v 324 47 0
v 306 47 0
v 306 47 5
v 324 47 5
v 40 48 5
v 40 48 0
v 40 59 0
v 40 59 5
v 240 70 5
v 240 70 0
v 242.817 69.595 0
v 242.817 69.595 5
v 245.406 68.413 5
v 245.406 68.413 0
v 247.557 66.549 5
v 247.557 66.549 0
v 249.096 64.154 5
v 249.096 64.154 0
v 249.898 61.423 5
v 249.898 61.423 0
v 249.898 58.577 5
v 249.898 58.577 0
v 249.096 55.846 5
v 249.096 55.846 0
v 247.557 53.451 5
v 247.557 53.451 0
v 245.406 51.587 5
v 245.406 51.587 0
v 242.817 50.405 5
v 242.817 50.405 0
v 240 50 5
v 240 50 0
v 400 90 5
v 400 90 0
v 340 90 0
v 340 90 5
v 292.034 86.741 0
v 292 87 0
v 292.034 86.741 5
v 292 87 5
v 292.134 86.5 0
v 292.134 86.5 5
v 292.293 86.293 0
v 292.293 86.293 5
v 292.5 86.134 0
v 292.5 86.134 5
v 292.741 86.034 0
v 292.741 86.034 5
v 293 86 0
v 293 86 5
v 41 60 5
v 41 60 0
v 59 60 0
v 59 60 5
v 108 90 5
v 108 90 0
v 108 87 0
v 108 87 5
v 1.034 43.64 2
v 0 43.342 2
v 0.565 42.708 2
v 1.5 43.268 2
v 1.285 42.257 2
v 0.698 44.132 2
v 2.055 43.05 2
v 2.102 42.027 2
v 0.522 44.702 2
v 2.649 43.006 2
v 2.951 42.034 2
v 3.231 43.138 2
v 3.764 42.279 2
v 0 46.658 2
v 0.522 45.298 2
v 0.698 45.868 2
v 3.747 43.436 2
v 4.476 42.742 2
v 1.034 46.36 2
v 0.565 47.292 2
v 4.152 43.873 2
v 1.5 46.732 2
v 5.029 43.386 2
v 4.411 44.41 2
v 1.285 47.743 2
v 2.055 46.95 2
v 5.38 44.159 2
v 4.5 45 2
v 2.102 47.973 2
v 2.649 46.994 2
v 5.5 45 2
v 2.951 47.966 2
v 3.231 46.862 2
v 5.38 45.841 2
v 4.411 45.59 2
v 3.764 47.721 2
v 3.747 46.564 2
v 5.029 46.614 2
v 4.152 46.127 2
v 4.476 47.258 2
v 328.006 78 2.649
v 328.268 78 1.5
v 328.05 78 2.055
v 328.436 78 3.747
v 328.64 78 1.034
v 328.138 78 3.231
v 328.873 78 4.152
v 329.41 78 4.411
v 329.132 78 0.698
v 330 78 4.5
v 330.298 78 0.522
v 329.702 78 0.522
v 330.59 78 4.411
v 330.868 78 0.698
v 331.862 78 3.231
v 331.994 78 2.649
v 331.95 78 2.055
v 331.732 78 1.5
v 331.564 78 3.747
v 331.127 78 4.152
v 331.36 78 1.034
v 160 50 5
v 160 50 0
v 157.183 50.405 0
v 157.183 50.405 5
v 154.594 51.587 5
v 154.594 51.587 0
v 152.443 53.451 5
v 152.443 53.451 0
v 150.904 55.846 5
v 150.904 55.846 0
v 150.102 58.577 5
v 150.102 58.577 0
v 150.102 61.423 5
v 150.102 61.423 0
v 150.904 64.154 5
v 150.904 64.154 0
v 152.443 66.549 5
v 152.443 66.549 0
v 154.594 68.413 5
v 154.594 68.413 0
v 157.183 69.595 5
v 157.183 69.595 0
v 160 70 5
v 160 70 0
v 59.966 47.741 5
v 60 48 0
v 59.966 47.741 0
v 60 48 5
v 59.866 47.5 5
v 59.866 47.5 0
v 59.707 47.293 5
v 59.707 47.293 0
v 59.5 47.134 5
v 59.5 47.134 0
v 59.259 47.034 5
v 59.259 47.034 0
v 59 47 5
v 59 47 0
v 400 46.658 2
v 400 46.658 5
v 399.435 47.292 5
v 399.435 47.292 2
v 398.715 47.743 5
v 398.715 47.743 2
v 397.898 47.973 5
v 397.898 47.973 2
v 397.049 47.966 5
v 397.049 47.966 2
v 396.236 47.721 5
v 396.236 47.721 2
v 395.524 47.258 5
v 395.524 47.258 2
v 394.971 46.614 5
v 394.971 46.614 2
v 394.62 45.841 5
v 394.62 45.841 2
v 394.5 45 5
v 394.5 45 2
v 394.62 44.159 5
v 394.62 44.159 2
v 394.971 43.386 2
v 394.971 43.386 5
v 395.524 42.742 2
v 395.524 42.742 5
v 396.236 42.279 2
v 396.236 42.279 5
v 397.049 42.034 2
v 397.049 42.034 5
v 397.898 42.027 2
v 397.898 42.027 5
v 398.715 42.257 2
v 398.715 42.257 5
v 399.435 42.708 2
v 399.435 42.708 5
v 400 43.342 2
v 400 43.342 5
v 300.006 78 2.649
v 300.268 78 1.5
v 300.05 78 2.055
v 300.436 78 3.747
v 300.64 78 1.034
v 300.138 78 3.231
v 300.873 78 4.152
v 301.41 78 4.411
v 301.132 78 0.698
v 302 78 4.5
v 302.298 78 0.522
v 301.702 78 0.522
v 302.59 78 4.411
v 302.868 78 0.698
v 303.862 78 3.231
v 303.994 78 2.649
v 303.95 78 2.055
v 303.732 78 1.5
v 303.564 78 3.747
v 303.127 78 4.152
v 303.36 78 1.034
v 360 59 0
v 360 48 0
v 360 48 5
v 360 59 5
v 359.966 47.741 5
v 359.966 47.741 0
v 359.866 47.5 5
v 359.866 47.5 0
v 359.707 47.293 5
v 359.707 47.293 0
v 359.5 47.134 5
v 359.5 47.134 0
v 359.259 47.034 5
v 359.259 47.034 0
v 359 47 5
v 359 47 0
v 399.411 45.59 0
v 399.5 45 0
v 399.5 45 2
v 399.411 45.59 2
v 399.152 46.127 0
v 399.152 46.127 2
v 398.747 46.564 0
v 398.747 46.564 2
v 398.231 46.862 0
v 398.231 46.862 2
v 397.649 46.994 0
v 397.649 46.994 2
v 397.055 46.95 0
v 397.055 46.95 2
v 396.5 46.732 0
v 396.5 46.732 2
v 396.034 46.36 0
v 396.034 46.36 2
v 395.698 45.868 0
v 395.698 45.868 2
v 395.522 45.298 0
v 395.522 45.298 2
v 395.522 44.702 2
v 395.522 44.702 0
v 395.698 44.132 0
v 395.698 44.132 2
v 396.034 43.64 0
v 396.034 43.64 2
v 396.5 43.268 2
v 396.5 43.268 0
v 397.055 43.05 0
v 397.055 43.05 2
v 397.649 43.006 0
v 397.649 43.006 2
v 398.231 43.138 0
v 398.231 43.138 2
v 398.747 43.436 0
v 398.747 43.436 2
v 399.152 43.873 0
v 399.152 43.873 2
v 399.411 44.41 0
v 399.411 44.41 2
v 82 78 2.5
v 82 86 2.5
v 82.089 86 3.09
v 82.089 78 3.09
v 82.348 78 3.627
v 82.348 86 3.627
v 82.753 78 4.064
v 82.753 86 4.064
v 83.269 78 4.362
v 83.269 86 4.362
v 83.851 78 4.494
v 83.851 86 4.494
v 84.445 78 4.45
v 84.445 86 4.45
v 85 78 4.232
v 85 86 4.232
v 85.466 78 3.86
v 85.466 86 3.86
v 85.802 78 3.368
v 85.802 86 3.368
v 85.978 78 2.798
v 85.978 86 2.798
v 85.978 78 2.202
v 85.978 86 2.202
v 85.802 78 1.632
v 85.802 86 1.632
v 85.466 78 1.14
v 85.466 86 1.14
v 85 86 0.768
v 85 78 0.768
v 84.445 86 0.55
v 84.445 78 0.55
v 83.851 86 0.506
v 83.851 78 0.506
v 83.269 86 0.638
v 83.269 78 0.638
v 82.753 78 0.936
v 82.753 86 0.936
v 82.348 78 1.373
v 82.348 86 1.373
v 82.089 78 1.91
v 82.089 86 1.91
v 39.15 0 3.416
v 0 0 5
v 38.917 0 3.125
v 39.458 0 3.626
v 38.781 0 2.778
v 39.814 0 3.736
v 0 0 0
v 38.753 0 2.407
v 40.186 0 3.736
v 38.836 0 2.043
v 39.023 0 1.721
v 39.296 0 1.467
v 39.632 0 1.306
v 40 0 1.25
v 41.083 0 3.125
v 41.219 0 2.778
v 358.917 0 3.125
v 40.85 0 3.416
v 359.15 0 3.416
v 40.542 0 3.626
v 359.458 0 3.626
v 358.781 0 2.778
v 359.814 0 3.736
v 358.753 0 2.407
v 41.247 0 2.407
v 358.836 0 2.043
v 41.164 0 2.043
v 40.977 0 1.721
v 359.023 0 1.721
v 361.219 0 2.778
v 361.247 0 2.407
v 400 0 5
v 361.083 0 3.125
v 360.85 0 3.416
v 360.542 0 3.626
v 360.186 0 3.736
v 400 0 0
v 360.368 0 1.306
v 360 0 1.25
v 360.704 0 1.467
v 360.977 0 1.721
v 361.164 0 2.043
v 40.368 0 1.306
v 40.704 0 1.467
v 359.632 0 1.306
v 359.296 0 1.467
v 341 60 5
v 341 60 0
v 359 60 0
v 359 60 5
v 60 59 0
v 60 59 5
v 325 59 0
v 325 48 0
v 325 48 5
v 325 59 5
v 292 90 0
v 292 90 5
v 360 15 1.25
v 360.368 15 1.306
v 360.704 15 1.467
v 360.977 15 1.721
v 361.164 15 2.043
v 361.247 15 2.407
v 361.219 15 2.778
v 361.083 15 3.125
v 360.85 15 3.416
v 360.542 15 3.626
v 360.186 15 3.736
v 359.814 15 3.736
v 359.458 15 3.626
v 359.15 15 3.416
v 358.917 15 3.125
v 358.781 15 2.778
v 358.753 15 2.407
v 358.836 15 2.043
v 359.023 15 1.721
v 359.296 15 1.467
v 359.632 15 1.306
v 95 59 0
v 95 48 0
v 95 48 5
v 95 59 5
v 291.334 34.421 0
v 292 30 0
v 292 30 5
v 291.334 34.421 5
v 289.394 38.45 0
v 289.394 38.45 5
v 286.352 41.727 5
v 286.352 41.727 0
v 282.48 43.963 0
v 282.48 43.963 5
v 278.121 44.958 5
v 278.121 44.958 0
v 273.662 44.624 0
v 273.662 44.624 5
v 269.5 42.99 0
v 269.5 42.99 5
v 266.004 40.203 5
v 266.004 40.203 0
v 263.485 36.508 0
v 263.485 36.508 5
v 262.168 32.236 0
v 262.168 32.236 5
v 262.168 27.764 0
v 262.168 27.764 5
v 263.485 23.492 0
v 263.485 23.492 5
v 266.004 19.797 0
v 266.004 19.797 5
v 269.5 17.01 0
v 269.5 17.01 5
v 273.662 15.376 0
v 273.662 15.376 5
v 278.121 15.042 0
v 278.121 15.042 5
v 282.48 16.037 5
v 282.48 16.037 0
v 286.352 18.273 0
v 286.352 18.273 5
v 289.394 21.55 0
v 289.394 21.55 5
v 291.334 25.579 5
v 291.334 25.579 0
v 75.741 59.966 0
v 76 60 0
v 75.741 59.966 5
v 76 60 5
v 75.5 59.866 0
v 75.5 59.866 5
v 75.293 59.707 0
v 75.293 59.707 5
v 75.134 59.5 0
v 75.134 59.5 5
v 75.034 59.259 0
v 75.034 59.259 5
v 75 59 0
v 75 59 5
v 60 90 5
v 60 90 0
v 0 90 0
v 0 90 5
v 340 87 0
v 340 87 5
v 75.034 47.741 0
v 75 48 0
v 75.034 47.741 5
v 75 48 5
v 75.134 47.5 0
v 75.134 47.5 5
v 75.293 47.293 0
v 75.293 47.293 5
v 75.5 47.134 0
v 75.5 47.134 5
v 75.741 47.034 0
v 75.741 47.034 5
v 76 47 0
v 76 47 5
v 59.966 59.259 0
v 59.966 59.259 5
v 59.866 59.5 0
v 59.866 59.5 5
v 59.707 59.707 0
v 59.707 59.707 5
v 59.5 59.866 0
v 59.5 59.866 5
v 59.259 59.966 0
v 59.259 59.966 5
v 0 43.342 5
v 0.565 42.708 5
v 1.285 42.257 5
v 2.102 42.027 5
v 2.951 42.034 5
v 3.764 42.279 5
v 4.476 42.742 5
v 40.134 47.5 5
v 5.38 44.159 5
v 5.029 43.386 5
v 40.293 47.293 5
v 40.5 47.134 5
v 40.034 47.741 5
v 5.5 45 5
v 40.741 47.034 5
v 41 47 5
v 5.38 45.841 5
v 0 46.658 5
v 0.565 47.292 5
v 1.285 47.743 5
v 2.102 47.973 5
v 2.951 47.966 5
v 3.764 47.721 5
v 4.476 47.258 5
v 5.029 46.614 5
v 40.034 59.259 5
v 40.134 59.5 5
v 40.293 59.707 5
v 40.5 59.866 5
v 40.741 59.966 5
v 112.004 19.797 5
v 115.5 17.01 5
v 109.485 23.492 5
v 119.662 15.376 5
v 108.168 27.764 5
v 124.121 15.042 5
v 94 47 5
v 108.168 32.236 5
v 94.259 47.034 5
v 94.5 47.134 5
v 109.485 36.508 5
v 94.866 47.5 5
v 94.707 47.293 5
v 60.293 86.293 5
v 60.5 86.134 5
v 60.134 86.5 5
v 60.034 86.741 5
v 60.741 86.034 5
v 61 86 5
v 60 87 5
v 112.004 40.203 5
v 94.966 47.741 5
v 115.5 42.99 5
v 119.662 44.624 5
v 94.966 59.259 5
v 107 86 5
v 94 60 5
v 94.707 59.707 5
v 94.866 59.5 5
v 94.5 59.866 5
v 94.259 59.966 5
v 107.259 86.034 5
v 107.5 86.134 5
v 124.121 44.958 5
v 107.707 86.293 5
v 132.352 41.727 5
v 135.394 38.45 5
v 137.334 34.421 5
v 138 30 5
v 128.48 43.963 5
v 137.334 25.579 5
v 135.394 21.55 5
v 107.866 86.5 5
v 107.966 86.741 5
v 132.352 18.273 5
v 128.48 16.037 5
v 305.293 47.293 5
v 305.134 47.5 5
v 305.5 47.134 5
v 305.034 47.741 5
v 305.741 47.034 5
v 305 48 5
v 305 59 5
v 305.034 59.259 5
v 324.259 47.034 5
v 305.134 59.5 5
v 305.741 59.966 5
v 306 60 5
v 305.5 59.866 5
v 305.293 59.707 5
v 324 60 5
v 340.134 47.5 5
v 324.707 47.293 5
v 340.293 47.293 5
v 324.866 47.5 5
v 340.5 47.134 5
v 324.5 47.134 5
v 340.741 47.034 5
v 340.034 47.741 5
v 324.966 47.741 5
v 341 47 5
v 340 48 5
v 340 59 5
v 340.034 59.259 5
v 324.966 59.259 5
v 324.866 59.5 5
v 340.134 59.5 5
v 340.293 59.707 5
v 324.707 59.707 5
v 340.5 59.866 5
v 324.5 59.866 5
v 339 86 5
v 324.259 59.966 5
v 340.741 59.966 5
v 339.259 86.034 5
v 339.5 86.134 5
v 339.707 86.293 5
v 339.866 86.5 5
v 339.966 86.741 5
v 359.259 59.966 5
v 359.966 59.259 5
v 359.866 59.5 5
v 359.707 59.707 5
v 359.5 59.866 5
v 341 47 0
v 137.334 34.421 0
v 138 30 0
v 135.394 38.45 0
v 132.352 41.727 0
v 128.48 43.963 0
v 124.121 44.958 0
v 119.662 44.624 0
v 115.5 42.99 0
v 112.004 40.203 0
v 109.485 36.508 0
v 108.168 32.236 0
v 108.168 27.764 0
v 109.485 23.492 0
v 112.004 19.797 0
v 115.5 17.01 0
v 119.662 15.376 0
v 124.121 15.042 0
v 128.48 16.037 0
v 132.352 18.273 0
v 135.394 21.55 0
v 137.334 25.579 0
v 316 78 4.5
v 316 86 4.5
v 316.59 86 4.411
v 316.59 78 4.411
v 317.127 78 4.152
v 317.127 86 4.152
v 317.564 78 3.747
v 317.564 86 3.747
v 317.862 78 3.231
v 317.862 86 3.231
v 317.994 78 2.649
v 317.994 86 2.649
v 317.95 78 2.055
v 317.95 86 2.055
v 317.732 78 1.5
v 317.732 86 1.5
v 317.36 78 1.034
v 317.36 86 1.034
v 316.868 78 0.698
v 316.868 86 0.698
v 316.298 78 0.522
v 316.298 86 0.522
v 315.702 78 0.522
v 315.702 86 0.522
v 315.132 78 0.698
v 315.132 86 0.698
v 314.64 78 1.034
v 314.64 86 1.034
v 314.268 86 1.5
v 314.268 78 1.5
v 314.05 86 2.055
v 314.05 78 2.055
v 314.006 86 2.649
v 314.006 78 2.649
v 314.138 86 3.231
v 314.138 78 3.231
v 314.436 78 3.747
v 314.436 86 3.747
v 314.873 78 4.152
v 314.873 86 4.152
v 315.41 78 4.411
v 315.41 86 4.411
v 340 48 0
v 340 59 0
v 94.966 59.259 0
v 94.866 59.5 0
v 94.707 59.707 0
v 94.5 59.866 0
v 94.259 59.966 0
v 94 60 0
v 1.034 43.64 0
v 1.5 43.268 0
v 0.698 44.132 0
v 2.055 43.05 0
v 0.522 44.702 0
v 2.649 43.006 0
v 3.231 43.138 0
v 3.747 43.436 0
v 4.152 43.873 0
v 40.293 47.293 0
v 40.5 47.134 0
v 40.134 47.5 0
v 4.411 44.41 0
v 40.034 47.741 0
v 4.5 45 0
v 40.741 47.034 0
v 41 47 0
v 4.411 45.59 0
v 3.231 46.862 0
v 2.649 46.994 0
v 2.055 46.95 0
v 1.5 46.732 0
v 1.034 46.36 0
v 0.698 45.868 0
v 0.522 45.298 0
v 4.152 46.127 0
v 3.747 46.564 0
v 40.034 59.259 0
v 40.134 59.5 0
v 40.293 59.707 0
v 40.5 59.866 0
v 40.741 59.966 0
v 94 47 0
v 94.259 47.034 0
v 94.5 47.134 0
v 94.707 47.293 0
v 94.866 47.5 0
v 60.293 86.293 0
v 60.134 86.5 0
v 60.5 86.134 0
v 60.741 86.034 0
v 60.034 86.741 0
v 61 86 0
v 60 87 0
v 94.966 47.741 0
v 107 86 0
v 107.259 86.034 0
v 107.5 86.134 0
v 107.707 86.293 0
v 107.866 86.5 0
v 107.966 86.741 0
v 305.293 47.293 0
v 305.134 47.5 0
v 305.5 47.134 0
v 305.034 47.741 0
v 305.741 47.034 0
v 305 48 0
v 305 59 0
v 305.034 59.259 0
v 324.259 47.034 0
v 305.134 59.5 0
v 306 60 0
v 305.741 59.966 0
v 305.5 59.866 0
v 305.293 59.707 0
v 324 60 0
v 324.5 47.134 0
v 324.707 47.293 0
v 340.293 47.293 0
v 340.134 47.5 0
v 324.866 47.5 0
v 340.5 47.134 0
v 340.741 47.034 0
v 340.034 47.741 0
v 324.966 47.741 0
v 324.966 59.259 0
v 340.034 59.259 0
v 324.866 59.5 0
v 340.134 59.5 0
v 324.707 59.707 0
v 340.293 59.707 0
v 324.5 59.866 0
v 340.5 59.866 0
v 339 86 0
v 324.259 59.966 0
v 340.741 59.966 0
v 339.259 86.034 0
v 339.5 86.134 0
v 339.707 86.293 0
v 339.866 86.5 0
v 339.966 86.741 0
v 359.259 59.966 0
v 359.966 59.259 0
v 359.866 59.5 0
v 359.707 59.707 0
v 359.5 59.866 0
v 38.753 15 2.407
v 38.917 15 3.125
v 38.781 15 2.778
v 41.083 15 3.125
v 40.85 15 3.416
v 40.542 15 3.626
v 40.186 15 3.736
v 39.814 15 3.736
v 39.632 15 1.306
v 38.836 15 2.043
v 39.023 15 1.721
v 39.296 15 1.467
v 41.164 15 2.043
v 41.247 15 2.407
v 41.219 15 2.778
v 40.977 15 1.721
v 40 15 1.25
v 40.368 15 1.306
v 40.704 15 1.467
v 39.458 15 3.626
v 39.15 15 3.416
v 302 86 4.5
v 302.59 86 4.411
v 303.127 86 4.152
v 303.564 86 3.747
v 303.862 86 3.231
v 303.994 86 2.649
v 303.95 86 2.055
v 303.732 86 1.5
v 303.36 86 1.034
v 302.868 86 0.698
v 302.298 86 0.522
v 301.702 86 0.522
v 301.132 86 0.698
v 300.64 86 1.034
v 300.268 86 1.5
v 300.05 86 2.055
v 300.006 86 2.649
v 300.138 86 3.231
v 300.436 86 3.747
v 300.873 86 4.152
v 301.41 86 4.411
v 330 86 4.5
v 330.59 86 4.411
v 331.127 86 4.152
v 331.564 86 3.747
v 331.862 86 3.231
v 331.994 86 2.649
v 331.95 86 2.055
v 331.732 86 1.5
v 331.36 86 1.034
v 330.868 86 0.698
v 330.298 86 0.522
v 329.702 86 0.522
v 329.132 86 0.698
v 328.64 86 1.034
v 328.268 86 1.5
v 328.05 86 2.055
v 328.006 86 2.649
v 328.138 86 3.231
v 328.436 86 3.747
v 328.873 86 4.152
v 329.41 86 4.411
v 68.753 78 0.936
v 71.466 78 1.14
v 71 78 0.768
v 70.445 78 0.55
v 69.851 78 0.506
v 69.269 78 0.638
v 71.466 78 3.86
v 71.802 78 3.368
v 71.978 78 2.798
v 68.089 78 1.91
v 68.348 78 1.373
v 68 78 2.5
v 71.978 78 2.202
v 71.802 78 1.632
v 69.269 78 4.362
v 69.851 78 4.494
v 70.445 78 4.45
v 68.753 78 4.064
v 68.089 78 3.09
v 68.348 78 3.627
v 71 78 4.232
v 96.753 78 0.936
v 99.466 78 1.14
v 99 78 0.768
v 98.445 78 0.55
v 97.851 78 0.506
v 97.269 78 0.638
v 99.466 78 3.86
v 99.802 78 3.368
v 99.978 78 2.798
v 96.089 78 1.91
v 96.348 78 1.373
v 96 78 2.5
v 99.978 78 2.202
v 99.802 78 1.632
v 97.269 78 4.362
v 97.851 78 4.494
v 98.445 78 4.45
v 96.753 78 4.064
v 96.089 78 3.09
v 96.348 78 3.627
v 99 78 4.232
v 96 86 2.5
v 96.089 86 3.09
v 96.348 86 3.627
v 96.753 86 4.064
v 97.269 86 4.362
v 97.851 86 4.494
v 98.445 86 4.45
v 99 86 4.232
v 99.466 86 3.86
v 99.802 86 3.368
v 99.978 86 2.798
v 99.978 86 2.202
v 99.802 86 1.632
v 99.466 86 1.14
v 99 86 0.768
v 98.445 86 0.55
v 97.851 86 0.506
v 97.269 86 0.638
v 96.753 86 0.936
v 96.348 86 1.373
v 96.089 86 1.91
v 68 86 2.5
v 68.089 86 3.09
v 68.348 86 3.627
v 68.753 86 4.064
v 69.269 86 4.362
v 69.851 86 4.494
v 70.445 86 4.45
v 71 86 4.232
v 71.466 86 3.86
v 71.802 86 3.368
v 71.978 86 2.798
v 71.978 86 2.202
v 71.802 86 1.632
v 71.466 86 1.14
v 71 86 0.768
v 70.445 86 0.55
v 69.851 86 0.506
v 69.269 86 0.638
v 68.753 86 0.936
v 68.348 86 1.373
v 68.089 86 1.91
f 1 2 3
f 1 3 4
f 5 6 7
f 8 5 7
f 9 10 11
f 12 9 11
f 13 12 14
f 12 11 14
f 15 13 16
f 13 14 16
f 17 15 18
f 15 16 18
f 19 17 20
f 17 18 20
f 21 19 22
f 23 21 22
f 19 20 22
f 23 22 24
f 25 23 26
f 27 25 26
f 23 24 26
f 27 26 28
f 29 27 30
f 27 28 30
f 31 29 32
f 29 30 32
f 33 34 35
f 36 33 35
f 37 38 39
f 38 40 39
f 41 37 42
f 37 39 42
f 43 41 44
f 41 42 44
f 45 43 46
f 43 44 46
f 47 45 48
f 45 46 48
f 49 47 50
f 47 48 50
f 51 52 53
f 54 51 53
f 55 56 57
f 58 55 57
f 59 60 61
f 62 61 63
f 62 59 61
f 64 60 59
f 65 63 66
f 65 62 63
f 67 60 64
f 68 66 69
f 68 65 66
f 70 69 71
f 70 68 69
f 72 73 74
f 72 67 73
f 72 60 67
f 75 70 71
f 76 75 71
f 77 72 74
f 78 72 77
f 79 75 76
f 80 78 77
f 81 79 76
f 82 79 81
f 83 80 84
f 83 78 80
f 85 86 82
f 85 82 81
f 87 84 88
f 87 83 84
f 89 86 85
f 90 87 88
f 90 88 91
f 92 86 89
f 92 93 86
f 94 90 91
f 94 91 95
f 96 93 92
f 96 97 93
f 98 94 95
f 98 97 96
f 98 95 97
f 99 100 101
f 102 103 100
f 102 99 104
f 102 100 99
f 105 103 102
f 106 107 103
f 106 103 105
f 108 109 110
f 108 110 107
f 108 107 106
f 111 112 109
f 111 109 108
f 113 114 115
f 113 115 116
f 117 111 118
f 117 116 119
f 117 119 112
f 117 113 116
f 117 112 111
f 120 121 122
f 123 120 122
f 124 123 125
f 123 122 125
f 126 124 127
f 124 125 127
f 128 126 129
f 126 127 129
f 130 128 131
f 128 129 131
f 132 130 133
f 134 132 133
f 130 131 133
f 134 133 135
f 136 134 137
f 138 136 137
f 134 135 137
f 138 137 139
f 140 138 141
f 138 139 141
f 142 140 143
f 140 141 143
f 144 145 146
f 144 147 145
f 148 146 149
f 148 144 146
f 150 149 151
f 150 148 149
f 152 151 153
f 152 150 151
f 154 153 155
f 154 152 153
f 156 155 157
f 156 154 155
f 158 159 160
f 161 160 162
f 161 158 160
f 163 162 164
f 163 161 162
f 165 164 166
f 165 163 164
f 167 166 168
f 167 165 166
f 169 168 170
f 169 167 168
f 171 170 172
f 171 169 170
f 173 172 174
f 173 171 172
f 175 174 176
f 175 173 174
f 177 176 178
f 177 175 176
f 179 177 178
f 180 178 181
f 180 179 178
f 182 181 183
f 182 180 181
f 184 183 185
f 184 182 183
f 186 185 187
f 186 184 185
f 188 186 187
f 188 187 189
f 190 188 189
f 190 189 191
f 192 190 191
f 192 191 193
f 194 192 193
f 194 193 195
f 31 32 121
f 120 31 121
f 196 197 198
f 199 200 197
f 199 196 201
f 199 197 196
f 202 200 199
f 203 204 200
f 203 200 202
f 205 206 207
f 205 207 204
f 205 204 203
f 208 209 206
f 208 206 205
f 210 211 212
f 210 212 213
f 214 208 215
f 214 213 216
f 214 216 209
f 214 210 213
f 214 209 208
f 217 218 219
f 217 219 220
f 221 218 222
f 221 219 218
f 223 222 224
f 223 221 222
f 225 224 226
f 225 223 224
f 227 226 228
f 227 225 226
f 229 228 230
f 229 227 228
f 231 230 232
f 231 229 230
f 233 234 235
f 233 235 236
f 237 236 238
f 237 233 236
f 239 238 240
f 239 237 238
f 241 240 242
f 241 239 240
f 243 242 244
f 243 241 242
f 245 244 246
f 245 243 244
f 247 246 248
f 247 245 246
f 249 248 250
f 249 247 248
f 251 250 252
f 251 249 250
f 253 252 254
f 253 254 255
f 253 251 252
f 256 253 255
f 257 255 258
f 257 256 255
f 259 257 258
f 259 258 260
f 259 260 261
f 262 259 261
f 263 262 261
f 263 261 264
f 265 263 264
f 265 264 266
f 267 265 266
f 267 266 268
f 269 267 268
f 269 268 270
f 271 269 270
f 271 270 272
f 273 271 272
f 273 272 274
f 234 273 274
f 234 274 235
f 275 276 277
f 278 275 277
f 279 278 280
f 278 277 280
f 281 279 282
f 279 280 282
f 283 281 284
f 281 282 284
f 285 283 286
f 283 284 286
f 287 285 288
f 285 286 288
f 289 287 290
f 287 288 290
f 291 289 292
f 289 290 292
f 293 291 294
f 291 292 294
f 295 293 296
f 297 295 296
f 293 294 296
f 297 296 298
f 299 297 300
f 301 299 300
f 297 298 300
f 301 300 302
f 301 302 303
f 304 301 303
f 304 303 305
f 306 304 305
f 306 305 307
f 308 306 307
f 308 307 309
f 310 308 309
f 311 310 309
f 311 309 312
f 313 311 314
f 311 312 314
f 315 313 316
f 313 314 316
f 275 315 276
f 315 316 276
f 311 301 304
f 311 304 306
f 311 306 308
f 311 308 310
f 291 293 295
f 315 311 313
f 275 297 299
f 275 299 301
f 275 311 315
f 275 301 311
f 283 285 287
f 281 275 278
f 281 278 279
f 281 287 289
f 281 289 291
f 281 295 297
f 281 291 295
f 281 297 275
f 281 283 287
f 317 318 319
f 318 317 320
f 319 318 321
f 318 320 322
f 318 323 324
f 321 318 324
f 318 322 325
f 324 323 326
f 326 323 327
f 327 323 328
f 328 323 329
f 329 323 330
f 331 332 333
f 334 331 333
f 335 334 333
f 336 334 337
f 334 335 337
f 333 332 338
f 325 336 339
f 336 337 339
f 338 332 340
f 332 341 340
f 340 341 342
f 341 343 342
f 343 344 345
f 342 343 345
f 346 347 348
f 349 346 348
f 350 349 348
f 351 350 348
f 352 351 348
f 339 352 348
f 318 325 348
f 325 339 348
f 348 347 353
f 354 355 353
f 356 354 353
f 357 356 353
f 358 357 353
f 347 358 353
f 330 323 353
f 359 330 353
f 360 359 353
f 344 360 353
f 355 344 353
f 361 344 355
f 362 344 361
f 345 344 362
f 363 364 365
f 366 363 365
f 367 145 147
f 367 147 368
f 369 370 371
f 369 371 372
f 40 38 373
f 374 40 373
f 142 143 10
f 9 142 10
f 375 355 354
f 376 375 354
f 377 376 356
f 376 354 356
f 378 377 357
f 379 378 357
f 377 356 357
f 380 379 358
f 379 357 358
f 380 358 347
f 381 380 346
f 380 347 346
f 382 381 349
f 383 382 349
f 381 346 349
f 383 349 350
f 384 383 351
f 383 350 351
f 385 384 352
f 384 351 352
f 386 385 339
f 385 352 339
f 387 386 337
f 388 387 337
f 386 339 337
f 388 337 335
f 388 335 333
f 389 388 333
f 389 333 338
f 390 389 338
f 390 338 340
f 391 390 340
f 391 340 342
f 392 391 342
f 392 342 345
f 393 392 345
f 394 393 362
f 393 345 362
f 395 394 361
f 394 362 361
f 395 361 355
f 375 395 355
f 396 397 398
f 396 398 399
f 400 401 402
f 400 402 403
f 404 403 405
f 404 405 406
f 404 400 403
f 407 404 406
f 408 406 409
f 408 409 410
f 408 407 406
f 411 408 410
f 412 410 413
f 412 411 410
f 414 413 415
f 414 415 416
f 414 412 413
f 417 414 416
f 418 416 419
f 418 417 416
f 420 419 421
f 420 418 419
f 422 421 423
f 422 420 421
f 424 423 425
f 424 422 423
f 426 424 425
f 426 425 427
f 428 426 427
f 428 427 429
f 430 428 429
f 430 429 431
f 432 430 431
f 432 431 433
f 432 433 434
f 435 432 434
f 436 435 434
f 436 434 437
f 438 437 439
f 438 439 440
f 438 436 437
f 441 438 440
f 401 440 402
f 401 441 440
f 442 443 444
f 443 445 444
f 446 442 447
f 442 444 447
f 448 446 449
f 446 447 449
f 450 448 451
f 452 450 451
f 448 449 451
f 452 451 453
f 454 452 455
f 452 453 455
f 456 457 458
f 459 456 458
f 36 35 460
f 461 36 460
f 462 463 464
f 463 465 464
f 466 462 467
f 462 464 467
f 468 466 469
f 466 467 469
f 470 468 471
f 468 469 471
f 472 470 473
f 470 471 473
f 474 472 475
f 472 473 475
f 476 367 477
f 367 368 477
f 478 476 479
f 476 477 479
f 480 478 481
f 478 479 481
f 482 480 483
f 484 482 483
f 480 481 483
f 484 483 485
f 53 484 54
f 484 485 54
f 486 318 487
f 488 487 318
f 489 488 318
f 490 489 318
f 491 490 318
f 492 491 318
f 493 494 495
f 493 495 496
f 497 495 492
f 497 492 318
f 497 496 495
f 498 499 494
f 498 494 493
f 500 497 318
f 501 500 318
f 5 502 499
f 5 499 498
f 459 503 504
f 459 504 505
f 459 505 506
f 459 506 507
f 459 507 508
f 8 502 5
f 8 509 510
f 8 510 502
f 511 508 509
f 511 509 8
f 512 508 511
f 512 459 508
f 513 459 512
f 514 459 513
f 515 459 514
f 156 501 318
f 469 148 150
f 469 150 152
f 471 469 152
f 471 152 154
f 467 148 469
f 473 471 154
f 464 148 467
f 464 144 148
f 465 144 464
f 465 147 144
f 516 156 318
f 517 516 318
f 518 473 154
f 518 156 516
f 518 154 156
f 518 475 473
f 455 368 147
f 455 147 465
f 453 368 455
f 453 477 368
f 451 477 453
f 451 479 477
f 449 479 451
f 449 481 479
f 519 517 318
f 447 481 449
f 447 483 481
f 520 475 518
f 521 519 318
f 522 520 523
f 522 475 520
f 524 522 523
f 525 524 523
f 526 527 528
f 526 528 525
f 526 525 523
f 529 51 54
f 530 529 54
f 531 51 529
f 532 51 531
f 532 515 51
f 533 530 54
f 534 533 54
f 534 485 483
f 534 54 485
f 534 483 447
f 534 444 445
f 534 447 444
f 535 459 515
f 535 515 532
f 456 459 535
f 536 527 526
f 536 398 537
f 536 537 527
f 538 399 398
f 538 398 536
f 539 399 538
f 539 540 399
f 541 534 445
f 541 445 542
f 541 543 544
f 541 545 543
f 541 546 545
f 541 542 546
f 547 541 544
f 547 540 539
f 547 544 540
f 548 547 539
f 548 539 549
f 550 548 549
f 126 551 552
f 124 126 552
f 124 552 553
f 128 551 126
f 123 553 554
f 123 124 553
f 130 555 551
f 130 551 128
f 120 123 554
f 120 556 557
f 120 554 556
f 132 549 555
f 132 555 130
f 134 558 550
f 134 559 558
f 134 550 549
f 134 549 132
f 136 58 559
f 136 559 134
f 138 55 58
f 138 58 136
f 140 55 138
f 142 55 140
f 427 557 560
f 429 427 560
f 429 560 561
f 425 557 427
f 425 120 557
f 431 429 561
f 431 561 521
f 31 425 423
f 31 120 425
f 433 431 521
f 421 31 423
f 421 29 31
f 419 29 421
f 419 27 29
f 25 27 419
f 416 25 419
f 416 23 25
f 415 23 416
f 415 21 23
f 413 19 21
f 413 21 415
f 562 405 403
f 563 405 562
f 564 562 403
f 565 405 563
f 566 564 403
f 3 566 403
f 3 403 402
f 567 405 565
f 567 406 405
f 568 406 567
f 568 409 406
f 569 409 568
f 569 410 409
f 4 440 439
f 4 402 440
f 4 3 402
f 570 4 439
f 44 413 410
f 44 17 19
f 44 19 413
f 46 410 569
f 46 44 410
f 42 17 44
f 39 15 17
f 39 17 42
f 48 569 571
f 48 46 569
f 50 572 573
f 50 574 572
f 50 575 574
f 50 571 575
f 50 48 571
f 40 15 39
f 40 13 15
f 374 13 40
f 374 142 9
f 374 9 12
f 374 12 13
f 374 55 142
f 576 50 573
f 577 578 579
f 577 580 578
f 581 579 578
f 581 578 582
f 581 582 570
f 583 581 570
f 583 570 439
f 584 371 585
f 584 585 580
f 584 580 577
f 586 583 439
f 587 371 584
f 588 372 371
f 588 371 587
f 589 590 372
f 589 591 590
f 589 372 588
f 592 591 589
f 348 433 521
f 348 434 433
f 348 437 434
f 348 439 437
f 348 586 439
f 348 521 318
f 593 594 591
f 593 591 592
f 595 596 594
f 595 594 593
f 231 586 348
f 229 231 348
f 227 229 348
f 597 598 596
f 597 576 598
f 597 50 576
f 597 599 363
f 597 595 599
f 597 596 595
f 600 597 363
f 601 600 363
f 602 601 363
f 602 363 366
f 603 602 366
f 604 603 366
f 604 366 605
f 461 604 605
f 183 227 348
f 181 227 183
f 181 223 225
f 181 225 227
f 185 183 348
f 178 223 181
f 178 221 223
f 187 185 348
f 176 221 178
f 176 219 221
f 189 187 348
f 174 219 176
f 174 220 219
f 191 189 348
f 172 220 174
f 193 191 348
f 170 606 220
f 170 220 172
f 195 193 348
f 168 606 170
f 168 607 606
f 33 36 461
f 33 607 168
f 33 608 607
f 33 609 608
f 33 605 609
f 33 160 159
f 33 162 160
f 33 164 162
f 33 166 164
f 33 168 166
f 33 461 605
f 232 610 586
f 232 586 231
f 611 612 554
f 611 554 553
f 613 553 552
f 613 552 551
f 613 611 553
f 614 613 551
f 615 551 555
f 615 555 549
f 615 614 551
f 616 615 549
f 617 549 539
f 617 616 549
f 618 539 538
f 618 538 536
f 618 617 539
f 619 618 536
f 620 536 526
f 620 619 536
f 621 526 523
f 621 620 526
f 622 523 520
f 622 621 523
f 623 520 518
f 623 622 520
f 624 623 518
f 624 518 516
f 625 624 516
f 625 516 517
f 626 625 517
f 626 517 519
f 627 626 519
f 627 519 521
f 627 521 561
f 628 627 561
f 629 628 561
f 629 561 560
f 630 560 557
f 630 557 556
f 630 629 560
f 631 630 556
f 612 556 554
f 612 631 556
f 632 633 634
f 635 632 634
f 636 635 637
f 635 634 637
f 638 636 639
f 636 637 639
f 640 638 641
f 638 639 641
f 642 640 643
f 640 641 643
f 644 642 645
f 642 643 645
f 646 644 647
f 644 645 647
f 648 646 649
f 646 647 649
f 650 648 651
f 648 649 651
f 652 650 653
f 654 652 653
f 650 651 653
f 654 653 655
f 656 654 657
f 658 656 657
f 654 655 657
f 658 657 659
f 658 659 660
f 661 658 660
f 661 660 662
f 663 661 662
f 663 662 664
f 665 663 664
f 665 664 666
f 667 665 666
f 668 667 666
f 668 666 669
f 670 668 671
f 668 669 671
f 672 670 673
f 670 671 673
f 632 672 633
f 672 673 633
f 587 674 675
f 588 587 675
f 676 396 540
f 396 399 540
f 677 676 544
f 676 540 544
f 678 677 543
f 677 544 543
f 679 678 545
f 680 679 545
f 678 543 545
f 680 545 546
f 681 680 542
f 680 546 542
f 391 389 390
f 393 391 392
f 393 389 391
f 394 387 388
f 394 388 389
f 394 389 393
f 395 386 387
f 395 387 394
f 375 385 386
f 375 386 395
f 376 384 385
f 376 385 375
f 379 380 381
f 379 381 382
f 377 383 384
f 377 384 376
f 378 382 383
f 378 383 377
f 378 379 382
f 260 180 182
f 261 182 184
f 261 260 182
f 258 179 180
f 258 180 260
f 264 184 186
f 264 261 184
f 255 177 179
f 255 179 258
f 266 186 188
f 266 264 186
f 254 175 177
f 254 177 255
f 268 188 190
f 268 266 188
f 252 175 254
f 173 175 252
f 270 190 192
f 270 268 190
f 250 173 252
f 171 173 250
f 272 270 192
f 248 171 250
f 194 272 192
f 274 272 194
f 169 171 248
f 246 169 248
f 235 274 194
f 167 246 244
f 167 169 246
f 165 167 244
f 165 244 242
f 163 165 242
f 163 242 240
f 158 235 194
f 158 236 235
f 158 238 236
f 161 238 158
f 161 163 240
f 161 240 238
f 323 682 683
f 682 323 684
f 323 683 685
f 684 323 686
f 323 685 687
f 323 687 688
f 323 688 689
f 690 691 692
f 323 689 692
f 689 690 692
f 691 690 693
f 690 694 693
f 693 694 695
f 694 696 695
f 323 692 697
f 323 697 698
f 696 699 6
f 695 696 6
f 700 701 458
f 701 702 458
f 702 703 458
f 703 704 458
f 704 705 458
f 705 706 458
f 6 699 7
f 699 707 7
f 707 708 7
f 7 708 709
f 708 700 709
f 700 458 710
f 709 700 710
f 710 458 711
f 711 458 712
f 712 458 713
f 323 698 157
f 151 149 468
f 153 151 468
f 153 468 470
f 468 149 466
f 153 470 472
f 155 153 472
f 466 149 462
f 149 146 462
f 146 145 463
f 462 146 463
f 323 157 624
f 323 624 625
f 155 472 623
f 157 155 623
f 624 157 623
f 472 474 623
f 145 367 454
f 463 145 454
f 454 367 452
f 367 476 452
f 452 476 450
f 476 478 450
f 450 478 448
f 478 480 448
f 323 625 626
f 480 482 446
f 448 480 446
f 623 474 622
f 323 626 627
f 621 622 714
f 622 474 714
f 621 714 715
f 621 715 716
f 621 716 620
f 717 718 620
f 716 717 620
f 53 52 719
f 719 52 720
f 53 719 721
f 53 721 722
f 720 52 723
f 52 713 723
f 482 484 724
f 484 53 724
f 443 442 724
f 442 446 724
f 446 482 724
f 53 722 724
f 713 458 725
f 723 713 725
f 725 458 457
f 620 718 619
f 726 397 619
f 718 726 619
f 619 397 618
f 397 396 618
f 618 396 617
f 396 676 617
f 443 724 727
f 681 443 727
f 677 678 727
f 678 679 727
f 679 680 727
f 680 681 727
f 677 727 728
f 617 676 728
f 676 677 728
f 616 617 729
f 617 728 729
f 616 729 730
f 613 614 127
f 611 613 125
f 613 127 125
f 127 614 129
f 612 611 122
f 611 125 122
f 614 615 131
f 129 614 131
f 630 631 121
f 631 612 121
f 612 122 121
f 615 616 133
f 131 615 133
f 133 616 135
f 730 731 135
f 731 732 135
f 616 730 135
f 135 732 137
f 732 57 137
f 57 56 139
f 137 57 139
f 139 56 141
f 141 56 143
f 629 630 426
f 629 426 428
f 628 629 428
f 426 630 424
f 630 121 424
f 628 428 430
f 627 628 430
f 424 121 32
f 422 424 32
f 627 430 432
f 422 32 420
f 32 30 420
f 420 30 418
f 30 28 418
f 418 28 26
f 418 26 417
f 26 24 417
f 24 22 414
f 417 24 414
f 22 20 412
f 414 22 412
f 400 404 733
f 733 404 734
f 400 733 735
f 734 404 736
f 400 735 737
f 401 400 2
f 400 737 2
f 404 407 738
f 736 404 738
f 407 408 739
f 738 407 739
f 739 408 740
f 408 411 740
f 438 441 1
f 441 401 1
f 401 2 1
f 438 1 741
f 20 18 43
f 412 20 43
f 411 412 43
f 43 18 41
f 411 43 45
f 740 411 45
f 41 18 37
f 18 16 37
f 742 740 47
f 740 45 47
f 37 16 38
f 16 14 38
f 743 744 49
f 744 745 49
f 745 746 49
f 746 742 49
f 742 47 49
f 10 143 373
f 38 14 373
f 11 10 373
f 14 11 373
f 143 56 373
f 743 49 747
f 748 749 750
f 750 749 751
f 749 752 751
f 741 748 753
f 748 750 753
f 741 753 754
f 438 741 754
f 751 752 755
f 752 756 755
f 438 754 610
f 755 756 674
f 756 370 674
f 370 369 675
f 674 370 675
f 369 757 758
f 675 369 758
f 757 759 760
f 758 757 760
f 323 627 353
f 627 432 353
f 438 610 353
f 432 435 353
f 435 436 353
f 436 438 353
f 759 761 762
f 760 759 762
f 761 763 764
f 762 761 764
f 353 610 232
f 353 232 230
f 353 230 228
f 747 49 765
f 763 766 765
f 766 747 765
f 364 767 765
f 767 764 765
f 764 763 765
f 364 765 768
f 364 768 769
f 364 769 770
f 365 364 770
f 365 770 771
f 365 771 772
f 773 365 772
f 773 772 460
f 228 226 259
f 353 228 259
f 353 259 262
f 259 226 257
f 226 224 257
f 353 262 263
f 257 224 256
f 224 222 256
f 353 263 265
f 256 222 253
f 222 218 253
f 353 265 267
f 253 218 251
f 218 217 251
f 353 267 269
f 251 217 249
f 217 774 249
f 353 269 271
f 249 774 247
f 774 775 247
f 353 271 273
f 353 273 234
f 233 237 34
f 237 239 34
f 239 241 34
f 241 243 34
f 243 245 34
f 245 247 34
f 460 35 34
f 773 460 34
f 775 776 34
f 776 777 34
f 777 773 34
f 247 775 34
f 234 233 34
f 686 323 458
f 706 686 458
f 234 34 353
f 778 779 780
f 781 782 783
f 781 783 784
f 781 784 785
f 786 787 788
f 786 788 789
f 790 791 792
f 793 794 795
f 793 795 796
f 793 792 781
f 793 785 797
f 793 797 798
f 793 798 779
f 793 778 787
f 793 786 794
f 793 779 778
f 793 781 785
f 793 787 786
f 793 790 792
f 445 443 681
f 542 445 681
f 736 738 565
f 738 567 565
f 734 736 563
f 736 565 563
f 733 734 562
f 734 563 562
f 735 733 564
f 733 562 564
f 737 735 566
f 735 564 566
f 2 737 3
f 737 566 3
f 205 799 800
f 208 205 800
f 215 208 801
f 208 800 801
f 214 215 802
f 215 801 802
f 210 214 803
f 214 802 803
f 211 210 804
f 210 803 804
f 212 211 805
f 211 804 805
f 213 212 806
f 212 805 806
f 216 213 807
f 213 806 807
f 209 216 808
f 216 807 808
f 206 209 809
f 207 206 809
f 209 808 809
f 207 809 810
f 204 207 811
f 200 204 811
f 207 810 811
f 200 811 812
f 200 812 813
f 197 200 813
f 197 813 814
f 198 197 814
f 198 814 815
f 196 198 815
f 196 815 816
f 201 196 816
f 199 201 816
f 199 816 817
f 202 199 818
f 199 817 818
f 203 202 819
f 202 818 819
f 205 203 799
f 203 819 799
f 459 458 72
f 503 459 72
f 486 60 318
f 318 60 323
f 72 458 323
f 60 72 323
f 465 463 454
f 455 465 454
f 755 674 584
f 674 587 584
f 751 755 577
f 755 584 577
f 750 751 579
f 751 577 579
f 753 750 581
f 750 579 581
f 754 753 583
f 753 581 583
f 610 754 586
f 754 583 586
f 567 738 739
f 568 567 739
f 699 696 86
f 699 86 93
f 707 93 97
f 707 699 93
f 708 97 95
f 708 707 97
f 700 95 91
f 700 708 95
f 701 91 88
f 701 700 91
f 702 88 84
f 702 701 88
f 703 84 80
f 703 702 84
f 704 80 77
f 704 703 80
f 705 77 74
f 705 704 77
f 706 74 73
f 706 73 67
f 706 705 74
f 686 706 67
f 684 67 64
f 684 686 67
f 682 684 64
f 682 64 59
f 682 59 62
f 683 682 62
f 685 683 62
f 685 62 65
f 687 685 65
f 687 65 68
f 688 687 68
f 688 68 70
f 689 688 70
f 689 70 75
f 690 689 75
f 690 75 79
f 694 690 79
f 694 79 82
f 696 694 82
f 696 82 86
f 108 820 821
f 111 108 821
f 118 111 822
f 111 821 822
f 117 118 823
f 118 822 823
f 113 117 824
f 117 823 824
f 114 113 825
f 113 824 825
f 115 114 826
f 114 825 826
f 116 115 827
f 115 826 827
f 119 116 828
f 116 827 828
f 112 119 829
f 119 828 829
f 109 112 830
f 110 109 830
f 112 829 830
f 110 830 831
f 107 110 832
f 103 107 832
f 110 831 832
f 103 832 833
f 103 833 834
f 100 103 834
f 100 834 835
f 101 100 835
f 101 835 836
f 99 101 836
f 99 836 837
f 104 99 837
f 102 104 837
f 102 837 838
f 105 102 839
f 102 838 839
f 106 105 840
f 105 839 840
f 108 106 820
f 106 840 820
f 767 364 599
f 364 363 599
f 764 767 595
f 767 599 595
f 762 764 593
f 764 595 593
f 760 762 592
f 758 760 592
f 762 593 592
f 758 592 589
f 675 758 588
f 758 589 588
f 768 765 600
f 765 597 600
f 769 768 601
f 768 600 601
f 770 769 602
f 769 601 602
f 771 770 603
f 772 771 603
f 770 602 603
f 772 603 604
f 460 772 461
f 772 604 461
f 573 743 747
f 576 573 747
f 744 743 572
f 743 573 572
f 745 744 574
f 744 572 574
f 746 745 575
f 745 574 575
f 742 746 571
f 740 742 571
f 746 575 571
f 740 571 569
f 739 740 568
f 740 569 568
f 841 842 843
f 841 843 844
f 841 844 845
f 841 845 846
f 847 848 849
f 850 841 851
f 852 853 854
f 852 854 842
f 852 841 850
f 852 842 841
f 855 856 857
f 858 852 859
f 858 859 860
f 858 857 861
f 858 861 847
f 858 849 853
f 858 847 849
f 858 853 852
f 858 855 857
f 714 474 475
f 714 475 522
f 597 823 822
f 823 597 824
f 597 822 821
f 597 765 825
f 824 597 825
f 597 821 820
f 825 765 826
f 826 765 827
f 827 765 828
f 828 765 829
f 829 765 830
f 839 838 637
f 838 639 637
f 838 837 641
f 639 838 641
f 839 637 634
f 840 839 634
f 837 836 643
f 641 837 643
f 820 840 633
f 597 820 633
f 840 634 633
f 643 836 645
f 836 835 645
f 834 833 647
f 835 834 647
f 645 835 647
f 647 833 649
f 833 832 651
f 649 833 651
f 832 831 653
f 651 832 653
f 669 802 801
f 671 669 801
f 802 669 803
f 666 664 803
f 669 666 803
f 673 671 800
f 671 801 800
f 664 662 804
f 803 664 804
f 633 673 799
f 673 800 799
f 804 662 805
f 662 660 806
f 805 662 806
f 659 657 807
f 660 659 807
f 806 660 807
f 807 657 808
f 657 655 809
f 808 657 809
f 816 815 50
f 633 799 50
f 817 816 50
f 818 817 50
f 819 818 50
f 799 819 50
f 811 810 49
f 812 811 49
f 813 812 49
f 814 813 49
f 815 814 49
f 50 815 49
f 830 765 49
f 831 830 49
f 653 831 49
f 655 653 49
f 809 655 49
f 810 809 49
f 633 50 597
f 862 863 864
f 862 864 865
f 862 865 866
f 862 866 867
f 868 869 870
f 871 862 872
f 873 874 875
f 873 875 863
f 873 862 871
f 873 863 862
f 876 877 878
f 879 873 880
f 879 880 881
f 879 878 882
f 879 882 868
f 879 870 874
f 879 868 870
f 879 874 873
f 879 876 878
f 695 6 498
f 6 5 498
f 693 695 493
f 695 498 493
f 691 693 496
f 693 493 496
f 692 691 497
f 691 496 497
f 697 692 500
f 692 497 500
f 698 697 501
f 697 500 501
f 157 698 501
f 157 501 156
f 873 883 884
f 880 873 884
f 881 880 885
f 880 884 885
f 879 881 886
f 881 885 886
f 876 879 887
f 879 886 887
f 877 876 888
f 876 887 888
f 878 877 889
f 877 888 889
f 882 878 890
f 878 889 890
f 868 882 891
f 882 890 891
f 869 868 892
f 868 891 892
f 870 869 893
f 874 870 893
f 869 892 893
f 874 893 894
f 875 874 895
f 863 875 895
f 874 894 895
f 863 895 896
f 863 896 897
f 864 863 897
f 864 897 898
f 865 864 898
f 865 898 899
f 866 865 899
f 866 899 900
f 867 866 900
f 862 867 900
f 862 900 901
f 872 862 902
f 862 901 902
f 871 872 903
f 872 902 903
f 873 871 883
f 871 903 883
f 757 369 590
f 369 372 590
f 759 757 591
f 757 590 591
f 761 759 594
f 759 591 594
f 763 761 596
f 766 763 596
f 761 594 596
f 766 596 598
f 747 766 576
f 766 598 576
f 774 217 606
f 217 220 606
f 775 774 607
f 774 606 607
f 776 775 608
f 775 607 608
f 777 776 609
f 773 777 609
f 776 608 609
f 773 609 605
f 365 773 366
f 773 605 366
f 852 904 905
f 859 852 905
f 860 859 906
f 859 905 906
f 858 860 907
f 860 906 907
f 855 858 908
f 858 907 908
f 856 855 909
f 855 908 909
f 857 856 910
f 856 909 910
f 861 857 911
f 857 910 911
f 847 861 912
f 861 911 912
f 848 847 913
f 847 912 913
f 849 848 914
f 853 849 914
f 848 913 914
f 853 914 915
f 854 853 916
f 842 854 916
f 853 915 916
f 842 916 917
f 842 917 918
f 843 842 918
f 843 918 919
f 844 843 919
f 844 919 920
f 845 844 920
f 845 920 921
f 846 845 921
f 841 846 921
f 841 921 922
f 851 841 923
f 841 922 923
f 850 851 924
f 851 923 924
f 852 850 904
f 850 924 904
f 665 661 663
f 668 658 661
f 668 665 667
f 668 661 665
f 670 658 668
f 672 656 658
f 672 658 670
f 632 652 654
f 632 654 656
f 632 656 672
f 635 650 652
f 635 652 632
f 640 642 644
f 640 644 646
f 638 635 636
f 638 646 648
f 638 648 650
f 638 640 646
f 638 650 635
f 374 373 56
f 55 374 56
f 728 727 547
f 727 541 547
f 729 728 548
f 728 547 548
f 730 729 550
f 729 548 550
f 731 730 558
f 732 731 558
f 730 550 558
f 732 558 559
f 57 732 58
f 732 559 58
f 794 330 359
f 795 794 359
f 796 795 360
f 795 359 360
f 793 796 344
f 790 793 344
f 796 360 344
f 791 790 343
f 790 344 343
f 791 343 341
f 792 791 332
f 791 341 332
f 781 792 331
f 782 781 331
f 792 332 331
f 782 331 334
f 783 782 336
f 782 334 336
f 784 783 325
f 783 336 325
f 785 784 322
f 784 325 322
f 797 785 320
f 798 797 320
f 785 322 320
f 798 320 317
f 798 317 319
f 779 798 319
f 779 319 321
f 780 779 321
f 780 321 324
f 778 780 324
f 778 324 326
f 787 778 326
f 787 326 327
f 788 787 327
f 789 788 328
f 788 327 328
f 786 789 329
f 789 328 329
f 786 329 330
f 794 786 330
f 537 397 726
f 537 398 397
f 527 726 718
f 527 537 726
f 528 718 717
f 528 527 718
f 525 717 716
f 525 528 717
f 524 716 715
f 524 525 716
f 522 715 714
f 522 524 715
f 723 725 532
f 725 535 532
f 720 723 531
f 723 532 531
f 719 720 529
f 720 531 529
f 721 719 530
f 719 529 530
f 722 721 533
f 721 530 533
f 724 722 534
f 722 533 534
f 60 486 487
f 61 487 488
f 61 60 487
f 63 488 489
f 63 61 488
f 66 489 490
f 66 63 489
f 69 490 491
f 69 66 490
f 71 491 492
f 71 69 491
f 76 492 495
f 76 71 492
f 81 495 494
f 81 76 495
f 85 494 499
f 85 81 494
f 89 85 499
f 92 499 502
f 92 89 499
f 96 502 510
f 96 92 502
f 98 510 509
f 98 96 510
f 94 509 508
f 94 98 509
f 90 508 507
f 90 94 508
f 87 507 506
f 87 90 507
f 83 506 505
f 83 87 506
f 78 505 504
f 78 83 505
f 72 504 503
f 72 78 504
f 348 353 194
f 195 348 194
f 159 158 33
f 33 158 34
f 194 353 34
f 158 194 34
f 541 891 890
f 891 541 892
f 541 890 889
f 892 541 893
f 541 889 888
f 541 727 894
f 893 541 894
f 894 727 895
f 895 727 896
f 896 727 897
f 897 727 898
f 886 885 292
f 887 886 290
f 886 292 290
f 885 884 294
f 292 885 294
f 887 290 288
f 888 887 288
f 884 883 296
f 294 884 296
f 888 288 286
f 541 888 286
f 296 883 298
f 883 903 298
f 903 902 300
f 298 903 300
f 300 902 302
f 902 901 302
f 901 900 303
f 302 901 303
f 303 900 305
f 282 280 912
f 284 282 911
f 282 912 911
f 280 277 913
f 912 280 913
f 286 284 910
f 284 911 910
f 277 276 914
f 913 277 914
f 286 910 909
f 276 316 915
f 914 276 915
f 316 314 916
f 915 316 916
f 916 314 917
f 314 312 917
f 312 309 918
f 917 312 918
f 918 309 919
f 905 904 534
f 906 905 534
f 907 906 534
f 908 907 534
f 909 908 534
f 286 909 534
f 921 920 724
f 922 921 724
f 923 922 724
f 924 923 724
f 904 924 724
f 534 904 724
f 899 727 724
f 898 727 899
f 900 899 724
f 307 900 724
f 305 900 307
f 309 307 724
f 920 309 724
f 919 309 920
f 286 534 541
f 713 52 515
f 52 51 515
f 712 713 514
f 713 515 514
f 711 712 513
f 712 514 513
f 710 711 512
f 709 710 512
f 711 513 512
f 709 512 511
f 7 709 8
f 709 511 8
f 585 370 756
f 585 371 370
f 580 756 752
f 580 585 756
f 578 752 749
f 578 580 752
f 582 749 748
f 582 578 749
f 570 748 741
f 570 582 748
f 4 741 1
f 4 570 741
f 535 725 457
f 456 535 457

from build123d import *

# Parameters (mm, degrees)
SKETCH1_R           = 15
SKETCH1_R_2         = 2
SKETCH1_W           = 20
SKETCH1_H           = 13
BOSS_EXTRUDE1_DEPTH = 5
CUT_EXTRUDE2_START  = -3
SKETCH6_R           = 3
SKETCH6_R_2         = 2
CUT_EXTRUDE2_DEPTH  = 3
FILLET1_R           = 1
SKETCH7_R           = 1.25
CUT_EXTRUDE3_DEPTH  = 15
SKETCH9_R           = 2
CUT_EXTRUDE4_DEPTH  = 8
SKETCH8_R           = 2
CUT_EXTRUDE5_DEPTH  = 8


with BuildPart() as part:
    # Sketch1 → Boss-Extrude1 (new body)
    with BuildSketch(Plane.XY):
        Polygon((0, 90), (0, 0), (400, 0), (400, 90), (340, 90), (340, 86), (292, 86), (292, 90), (108, 90), (108, 86), (60, 86), (60, 90), align=None)
        with Locations((123, 30)):
            Circle(SKETCH1_R, mode=Mode.SUBTRACT)
        with Locations((277, 30)):
            Circle(SKETCH1_R, mode=Mode.SUBTRACT)
        with Locations((2.5, 45)):
            Circle(SKETCH1_R_2, mode=Mode.SUBTRACT)
        with Locations((50, 53.5)):
            Rectangle(SKETCH1_W, SKETCH1_H, mode=Mode.SUBTRACT)
        with Locations((85, 53.5)):
            Rectangle(SKETCH1_W, SKETCH1_H, mode=Mode.SUBTRACT)
        with BuildLine():
            ThreePointArc((160, 50), (150, 60), (160, 70))
            Line((160, 70), (240, 70))
            ThreePointArc((240, 70), (250, 60), (240, 50))
            Line((240, 50), (160, 50))
        make_face(mode=Mode.SUBTRACT)
        with Locations((315, 53.5)):
            Rectangle(SKETCH1_W, SKETCH1_H, mode=Mode.SUBTRACT)
        with Locations((397.5, 45)):
            Circle(SKETCH1_R_2, mode=Mode.SUBTRACT)
        with Locations((350, 53.5)):
            Rectangle(SKETCH1_W, SKETCH1_H, mode=Mode.SUBTRACT)
    extrude(amount=BOSS_EXTRUDE1_DEPTH)

    # Sketch6 → Cut-Extrude2 (cut)
    # profile 1 of 2: a face of its own
    with BuildSketch(Plane.XY.offset(5).offset(CUT_EXTRUDE2_START)):
        with Locations((397.5, 45)):
            Circle(SKETCH6_R)
        with Locations((397.5, 45)):
            Circle(SKETCH6_R_2, mode=Mode.SUBTRACT)
    # profile 2 of 2: a face of its own
    with BuildSketch(Plane.XY.offset(5).offset(CUT_EXTRUDE2_START)):
        with Locations((2.5, 45)):
            Circle(SKETCH6_R)
        with Locations((2.5, 45)):
            Circle(SKETCH6_R_2, mode=Mode.SUBTRACT)
    extrude(amount=CUT_EXTRUDE2_DEPTH, mode=Mode.SUBTRACT)

    # Fillet1
    fillet1_edges = [part.edges().sort_by_distance(p)[0] for p in [
        (340, 60, 2.5),
        (340, 47, 2.5),
        (360, 47, 2.5),
        (360, 60, 2.5),
        (305, 60, 2.5),
        (305, 47, 2.5),
        (325, 47, 2.5),
        (325, 60, 2.5),
        (75, 60, 2.5),
        (75, 47, 2.5),
        (95, 47, 2.5),
        (95, 60, 2.5),
        (40, 60, 2.5),
        (40, 47, 2.5),
        (60, 47, 2.5),
        (60, 60, 2.5),
        (60, 86, 2.5),
        (108, 86, 2.5),
        (292, 86, 2.5),
        (340, 86, 2.5),
    ]]
    fillet(fillet1_edges, radius=FILLET1_R)

    # Sketch7 → Cut-Extrude3 (cut)
    with BuildSketch(Plane.XZ):
        with Locations(Location((360, 2.5, 0), (0, 0, 270))):
            Circle(SKETCH7_R)
        with Locations(Location((40, 2.5, 0), (0, 0, 270))):
            Circle(SKETCH7_R)
    extrude(amount=-CUT_EXTRUDE3_DEPTH, mode=Mode.SUBTRACT)

    # Sketch9 → Cut-Extrude4 (cut)
    with BuildSketch(Plane(origin=(0, 86, 0), x_dir=(1, 0, 0), z_dir=(0, 1, 0))):
        with Locations(Location((330, -2.5, 0), (0, 0, 270))):
            Circle(SKETCH9_R)
        with Locations(Location((316, -2.5, 0), (0, 0, 270))):
            Circle(SKETCH9_R)
        with Locations(Location((302, -2.5, 0), (0, 0, 270))):
            Circle(SKETCH9_R)
    extrude(amount=-CUT_EXTRUDE4_DEPTH, mode=Mode.SUBTRACT)

    # Sketch8 → Cut-Extrude5 (cut)
    with BuildSketch(Plane(origin=(0, 86, 0), x_dir=(1, 0, 0), z_dir=(0, 1, 0))):
        with Locations(Location((70, -2.5, 0), (0, 0, 180))):
            Circle(SKETCH8_R)
        with Locations(Location((84, -2.5, 0), (0, 0, 180))):
            Circle(SKETCH8_R)
        with Locations(Location((98, -2.5, 0), (0, 0, 180))):
            Circle(SKETCH8_R)
    extrude(amount=-CUT_EXTRUDE5_DEPTH, mode=Mode.SUBTRACT)


solid = part.part
